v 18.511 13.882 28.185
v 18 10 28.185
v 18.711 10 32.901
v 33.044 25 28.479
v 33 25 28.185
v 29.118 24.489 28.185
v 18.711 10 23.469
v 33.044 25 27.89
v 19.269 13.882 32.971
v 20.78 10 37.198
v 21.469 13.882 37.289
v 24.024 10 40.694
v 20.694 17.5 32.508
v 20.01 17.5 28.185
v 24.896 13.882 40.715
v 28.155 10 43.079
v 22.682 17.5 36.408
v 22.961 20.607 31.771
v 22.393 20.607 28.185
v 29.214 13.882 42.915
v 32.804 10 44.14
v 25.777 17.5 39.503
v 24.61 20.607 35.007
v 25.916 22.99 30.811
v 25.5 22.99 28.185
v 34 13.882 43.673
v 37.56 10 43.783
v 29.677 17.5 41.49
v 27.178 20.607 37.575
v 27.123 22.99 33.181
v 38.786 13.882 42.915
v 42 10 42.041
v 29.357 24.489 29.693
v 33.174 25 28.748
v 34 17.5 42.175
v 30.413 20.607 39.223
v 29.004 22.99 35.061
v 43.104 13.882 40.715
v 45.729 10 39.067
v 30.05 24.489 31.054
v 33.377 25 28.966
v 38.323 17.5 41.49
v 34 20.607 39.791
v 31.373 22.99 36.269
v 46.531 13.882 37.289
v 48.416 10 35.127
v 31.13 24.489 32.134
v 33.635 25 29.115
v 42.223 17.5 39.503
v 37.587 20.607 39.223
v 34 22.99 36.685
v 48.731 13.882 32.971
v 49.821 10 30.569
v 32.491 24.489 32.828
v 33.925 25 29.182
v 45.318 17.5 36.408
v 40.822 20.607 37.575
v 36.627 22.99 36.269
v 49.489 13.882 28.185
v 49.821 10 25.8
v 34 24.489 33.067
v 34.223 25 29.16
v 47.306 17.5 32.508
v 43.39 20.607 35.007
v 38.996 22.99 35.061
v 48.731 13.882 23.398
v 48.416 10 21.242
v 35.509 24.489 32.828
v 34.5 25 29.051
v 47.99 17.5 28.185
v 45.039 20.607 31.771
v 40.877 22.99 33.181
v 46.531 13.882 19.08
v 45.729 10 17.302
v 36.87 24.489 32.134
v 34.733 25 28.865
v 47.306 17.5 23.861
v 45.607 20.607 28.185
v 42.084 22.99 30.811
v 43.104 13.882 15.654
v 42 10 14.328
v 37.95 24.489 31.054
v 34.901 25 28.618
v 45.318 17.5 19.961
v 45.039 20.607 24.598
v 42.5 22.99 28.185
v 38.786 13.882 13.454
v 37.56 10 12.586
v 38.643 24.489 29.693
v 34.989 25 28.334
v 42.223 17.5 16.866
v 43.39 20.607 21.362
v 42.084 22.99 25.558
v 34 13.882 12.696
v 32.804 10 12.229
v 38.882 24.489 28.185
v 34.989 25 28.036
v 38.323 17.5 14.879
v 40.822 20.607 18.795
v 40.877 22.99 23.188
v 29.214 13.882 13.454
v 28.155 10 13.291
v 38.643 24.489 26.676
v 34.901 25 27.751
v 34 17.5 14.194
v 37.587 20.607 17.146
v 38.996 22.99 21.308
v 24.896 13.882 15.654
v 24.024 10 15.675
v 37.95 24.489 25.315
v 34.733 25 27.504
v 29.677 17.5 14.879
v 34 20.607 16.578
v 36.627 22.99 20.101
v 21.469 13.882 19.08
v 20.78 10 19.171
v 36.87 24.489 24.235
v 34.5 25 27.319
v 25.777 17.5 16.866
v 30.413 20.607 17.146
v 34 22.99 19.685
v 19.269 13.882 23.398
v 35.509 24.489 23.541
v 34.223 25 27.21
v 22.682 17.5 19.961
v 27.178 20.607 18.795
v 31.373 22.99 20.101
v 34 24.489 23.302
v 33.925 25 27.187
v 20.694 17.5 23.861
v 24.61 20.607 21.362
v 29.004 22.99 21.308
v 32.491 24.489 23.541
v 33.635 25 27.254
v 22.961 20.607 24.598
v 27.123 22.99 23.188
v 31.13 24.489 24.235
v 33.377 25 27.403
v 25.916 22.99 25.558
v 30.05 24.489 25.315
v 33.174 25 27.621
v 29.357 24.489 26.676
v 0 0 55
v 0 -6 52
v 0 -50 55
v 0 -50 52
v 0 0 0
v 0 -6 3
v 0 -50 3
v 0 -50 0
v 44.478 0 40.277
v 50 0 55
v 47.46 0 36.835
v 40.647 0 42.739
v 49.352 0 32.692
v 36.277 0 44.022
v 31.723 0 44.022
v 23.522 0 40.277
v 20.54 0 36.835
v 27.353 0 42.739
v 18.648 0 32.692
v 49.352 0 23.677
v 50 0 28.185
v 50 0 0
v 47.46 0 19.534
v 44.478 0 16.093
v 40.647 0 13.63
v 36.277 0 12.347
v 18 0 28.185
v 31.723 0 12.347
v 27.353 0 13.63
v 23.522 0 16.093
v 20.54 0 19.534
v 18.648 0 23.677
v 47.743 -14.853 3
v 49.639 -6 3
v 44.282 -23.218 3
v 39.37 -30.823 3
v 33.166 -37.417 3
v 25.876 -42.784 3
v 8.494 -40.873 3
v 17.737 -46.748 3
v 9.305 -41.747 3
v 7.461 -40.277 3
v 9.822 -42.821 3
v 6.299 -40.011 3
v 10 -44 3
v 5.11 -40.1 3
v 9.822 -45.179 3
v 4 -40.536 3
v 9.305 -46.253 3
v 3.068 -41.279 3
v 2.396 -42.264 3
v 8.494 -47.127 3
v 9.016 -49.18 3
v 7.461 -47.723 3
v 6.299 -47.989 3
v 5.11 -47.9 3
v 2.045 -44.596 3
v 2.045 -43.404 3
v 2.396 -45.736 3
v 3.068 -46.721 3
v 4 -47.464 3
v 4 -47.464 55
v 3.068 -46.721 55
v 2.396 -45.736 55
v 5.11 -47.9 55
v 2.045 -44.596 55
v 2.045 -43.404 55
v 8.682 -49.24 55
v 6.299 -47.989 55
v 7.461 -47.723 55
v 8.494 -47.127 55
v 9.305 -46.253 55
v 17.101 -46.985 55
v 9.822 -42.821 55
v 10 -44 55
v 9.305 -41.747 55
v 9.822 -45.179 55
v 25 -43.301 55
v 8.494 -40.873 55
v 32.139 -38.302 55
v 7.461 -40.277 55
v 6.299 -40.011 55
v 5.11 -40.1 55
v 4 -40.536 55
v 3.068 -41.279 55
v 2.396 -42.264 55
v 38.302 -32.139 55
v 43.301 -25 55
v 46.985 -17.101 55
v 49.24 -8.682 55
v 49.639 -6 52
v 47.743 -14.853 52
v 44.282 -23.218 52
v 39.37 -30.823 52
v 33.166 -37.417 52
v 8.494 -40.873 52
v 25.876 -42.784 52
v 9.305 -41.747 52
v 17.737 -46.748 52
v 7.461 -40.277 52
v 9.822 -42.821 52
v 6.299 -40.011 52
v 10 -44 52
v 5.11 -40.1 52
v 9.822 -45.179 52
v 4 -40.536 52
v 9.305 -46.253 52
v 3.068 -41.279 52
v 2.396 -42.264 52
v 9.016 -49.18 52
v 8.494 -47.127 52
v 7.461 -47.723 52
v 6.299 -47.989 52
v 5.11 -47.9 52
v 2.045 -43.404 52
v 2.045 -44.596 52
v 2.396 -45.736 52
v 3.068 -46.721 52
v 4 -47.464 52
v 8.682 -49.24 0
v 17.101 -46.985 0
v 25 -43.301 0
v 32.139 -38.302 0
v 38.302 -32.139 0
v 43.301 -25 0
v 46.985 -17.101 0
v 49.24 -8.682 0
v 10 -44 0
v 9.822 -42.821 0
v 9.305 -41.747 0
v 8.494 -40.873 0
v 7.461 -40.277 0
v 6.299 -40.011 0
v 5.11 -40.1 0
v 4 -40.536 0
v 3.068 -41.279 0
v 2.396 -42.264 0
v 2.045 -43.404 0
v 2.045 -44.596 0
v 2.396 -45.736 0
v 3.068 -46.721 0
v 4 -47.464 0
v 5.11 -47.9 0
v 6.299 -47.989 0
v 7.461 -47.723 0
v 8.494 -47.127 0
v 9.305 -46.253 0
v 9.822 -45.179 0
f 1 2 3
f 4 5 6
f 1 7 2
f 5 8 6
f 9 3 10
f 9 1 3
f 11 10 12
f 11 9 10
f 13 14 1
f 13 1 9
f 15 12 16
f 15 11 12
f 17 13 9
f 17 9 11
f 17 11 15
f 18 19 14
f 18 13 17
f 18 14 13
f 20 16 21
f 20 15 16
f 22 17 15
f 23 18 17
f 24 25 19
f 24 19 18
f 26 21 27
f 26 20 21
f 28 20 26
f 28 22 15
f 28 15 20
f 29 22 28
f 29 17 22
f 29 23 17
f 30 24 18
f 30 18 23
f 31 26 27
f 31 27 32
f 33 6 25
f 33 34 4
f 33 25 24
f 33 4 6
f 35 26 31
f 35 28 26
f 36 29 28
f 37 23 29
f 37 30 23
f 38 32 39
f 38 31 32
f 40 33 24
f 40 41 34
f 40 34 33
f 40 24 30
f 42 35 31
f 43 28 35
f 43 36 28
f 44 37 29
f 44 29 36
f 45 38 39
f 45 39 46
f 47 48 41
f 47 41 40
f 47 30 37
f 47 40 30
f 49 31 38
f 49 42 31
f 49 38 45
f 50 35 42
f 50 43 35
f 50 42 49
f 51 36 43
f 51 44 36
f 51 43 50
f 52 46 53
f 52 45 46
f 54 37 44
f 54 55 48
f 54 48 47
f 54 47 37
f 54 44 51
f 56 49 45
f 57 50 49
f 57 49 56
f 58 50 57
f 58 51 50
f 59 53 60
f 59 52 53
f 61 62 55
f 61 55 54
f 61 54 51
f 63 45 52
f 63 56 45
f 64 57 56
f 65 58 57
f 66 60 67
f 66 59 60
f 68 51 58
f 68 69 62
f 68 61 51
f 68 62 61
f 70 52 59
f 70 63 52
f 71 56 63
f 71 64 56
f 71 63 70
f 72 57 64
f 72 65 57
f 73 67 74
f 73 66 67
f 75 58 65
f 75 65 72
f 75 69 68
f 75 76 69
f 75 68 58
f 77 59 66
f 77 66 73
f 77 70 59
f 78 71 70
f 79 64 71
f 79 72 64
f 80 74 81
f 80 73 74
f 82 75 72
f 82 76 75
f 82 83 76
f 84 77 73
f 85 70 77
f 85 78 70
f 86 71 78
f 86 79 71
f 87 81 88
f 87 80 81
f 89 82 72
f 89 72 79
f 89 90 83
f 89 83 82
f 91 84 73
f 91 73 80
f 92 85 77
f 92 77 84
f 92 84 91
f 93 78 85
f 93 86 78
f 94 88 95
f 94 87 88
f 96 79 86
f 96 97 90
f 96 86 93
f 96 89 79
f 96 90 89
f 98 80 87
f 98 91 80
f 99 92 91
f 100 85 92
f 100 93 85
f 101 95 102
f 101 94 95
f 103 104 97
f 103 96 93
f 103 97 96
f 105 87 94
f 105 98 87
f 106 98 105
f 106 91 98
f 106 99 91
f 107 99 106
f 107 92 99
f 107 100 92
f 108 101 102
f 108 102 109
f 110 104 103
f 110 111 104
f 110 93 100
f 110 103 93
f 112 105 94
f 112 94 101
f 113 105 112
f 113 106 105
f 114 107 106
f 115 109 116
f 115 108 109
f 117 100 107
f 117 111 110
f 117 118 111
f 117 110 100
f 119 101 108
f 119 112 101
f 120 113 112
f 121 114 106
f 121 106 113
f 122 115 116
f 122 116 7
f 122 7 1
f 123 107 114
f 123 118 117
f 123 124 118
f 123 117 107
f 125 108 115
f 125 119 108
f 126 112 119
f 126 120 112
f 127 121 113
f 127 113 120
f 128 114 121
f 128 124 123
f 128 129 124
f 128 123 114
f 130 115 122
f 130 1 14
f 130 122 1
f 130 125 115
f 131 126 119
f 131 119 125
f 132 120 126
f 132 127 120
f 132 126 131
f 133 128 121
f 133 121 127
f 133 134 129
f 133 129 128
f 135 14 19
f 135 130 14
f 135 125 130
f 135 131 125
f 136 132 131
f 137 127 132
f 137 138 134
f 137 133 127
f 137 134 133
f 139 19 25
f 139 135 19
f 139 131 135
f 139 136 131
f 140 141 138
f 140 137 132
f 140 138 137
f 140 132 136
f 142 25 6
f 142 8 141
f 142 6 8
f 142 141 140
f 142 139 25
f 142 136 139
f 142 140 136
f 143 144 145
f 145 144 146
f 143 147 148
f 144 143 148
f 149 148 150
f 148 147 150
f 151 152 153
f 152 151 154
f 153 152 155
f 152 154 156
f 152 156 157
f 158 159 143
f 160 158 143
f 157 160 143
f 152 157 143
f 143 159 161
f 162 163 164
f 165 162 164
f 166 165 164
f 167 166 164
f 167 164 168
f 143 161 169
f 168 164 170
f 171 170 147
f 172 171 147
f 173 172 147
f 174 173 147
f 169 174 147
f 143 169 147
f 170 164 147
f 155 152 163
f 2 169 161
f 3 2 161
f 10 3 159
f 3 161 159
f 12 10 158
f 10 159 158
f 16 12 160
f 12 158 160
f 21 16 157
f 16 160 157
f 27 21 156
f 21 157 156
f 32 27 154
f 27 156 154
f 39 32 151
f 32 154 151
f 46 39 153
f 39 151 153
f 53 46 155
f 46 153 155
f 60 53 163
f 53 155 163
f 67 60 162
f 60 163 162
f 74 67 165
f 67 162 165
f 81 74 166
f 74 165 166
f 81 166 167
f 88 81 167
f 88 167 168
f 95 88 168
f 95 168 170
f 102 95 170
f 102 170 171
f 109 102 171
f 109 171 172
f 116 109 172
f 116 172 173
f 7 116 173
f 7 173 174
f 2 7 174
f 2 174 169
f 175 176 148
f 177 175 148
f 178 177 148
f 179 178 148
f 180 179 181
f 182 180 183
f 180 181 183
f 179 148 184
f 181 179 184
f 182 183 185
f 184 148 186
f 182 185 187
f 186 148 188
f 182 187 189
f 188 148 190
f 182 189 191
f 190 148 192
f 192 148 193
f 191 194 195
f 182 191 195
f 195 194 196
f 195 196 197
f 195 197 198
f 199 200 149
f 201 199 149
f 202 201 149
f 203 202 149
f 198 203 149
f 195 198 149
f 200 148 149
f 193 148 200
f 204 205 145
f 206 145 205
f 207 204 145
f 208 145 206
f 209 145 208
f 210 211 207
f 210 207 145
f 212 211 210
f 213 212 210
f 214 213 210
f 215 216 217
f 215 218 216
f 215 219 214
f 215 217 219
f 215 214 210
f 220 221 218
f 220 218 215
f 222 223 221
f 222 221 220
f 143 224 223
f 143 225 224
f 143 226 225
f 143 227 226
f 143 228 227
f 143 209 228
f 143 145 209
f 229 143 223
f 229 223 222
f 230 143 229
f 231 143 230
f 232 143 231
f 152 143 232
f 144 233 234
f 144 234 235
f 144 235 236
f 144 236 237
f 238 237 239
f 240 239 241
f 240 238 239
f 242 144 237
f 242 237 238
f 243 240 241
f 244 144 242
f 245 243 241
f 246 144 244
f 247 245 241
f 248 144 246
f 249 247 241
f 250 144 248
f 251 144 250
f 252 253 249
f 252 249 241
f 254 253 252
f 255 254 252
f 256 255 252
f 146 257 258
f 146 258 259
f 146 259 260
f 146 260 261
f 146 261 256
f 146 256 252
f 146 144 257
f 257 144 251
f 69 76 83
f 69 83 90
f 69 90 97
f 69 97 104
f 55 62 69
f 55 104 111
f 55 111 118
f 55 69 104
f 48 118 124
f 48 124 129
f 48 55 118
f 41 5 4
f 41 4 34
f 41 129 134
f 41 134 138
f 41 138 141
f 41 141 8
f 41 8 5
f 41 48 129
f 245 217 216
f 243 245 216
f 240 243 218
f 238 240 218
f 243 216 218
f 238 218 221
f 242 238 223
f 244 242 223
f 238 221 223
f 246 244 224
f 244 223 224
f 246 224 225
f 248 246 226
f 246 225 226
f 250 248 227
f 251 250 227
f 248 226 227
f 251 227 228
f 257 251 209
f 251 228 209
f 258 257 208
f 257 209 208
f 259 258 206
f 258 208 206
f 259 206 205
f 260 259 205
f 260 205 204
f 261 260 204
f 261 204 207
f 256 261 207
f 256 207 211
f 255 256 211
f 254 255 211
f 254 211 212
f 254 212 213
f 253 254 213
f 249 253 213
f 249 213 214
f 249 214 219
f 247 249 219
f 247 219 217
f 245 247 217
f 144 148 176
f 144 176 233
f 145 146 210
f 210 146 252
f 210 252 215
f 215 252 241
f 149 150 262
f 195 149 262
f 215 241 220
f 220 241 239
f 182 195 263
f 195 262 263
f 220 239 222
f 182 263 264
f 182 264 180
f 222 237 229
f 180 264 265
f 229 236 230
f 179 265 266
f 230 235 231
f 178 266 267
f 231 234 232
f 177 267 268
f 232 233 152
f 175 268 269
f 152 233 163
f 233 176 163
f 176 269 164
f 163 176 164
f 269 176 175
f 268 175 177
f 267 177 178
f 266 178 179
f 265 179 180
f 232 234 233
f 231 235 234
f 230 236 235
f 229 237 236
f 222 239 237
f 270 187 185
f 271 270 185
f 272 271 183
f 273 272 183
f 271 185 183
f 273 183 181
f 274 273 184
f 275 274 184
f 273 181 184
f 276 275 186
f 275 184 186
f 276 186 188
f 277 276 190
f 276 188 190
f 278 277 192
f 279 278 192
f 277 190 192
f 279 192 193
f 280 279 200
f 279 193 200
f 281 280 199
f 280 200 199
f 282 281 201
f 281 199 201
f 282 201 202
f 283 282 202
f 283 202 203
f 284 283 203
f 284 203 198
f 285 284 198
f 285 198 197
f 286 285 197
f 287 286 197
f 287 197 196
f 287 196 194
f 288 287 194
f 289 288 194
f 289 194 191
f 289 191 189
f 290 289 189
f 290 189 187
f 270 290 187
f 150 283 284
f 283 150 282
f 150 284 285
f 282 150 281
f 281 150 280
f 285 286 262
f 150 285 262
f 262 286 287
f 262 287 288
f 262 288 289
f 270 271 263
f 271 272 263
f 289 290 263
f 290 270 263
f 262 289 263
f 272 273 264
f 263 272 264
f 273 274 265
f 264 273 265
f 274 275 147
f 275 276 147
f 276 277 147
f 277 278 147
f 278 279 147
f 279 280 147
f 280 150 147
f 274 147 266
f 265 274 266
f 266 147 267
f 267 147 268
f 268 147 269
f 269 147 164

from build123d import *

# Parameters (mm, degrees)
F1_DEPTH = 55
F2_W     = 44
F2_H     = 49
F3_DEPTH = 50.001
F4_R     = 4
F5_DEPTH = 55
F6_R     = 16
F7_DEPTH = 25
F8_R     = 15


with BuildPart() as f1:
    # F0 (on Top) → F1 (new body)
    with BuildSketch(Plane.XY):
        with BuildLine():
            Line((0, 0), (0, -50))
            ThreePointArc((0, -50), (35.355339, -35.355339), (50, 0))
            Line((50, 0), (0, 0))
        make_face()
    extrude(amount=F1_DEPTH)

    # F2 (on face) → F3 (cut, through all)
    with BuildSketch(Plane(origin=(0, 0, 0), x_dir=(0, -1, 0), z_dir=(-1, 0, 0))):
        with Locations((28, 27.5)):
            Rectangle(F2_W, F2_H)
    extrude(amount=-F3_DEPTH, mode=Mode.SUBTRACT)

    # F4 (on face) → F5 (cut)
    with BuildSketch(Plane.XY.offset(55)):
        with Locations((6, -44)):
            Circle(F4_R)
    extrude(amount=-F5_DEPTH, mode=Mode.SUBTRACT)

    # F6 (on face) → F7 (join)
    with BuildSketch(Plane(origin=(0, 0, 0), x_dir=(-1, 0, 0), z_dir=(0, 1, 0))):
        with Locations((-34, 28.184593)):
            Circle(F6_R)
    extrude(amount=F7_DEPTH)

    # F8
    f8_edges = [f1.edges().sort_by_distance(p)[0] for p in [
        (50, 25, 28.184593),
    ]]
    fillet(f8_edges, radius=F8_R)


solid = f1.part
